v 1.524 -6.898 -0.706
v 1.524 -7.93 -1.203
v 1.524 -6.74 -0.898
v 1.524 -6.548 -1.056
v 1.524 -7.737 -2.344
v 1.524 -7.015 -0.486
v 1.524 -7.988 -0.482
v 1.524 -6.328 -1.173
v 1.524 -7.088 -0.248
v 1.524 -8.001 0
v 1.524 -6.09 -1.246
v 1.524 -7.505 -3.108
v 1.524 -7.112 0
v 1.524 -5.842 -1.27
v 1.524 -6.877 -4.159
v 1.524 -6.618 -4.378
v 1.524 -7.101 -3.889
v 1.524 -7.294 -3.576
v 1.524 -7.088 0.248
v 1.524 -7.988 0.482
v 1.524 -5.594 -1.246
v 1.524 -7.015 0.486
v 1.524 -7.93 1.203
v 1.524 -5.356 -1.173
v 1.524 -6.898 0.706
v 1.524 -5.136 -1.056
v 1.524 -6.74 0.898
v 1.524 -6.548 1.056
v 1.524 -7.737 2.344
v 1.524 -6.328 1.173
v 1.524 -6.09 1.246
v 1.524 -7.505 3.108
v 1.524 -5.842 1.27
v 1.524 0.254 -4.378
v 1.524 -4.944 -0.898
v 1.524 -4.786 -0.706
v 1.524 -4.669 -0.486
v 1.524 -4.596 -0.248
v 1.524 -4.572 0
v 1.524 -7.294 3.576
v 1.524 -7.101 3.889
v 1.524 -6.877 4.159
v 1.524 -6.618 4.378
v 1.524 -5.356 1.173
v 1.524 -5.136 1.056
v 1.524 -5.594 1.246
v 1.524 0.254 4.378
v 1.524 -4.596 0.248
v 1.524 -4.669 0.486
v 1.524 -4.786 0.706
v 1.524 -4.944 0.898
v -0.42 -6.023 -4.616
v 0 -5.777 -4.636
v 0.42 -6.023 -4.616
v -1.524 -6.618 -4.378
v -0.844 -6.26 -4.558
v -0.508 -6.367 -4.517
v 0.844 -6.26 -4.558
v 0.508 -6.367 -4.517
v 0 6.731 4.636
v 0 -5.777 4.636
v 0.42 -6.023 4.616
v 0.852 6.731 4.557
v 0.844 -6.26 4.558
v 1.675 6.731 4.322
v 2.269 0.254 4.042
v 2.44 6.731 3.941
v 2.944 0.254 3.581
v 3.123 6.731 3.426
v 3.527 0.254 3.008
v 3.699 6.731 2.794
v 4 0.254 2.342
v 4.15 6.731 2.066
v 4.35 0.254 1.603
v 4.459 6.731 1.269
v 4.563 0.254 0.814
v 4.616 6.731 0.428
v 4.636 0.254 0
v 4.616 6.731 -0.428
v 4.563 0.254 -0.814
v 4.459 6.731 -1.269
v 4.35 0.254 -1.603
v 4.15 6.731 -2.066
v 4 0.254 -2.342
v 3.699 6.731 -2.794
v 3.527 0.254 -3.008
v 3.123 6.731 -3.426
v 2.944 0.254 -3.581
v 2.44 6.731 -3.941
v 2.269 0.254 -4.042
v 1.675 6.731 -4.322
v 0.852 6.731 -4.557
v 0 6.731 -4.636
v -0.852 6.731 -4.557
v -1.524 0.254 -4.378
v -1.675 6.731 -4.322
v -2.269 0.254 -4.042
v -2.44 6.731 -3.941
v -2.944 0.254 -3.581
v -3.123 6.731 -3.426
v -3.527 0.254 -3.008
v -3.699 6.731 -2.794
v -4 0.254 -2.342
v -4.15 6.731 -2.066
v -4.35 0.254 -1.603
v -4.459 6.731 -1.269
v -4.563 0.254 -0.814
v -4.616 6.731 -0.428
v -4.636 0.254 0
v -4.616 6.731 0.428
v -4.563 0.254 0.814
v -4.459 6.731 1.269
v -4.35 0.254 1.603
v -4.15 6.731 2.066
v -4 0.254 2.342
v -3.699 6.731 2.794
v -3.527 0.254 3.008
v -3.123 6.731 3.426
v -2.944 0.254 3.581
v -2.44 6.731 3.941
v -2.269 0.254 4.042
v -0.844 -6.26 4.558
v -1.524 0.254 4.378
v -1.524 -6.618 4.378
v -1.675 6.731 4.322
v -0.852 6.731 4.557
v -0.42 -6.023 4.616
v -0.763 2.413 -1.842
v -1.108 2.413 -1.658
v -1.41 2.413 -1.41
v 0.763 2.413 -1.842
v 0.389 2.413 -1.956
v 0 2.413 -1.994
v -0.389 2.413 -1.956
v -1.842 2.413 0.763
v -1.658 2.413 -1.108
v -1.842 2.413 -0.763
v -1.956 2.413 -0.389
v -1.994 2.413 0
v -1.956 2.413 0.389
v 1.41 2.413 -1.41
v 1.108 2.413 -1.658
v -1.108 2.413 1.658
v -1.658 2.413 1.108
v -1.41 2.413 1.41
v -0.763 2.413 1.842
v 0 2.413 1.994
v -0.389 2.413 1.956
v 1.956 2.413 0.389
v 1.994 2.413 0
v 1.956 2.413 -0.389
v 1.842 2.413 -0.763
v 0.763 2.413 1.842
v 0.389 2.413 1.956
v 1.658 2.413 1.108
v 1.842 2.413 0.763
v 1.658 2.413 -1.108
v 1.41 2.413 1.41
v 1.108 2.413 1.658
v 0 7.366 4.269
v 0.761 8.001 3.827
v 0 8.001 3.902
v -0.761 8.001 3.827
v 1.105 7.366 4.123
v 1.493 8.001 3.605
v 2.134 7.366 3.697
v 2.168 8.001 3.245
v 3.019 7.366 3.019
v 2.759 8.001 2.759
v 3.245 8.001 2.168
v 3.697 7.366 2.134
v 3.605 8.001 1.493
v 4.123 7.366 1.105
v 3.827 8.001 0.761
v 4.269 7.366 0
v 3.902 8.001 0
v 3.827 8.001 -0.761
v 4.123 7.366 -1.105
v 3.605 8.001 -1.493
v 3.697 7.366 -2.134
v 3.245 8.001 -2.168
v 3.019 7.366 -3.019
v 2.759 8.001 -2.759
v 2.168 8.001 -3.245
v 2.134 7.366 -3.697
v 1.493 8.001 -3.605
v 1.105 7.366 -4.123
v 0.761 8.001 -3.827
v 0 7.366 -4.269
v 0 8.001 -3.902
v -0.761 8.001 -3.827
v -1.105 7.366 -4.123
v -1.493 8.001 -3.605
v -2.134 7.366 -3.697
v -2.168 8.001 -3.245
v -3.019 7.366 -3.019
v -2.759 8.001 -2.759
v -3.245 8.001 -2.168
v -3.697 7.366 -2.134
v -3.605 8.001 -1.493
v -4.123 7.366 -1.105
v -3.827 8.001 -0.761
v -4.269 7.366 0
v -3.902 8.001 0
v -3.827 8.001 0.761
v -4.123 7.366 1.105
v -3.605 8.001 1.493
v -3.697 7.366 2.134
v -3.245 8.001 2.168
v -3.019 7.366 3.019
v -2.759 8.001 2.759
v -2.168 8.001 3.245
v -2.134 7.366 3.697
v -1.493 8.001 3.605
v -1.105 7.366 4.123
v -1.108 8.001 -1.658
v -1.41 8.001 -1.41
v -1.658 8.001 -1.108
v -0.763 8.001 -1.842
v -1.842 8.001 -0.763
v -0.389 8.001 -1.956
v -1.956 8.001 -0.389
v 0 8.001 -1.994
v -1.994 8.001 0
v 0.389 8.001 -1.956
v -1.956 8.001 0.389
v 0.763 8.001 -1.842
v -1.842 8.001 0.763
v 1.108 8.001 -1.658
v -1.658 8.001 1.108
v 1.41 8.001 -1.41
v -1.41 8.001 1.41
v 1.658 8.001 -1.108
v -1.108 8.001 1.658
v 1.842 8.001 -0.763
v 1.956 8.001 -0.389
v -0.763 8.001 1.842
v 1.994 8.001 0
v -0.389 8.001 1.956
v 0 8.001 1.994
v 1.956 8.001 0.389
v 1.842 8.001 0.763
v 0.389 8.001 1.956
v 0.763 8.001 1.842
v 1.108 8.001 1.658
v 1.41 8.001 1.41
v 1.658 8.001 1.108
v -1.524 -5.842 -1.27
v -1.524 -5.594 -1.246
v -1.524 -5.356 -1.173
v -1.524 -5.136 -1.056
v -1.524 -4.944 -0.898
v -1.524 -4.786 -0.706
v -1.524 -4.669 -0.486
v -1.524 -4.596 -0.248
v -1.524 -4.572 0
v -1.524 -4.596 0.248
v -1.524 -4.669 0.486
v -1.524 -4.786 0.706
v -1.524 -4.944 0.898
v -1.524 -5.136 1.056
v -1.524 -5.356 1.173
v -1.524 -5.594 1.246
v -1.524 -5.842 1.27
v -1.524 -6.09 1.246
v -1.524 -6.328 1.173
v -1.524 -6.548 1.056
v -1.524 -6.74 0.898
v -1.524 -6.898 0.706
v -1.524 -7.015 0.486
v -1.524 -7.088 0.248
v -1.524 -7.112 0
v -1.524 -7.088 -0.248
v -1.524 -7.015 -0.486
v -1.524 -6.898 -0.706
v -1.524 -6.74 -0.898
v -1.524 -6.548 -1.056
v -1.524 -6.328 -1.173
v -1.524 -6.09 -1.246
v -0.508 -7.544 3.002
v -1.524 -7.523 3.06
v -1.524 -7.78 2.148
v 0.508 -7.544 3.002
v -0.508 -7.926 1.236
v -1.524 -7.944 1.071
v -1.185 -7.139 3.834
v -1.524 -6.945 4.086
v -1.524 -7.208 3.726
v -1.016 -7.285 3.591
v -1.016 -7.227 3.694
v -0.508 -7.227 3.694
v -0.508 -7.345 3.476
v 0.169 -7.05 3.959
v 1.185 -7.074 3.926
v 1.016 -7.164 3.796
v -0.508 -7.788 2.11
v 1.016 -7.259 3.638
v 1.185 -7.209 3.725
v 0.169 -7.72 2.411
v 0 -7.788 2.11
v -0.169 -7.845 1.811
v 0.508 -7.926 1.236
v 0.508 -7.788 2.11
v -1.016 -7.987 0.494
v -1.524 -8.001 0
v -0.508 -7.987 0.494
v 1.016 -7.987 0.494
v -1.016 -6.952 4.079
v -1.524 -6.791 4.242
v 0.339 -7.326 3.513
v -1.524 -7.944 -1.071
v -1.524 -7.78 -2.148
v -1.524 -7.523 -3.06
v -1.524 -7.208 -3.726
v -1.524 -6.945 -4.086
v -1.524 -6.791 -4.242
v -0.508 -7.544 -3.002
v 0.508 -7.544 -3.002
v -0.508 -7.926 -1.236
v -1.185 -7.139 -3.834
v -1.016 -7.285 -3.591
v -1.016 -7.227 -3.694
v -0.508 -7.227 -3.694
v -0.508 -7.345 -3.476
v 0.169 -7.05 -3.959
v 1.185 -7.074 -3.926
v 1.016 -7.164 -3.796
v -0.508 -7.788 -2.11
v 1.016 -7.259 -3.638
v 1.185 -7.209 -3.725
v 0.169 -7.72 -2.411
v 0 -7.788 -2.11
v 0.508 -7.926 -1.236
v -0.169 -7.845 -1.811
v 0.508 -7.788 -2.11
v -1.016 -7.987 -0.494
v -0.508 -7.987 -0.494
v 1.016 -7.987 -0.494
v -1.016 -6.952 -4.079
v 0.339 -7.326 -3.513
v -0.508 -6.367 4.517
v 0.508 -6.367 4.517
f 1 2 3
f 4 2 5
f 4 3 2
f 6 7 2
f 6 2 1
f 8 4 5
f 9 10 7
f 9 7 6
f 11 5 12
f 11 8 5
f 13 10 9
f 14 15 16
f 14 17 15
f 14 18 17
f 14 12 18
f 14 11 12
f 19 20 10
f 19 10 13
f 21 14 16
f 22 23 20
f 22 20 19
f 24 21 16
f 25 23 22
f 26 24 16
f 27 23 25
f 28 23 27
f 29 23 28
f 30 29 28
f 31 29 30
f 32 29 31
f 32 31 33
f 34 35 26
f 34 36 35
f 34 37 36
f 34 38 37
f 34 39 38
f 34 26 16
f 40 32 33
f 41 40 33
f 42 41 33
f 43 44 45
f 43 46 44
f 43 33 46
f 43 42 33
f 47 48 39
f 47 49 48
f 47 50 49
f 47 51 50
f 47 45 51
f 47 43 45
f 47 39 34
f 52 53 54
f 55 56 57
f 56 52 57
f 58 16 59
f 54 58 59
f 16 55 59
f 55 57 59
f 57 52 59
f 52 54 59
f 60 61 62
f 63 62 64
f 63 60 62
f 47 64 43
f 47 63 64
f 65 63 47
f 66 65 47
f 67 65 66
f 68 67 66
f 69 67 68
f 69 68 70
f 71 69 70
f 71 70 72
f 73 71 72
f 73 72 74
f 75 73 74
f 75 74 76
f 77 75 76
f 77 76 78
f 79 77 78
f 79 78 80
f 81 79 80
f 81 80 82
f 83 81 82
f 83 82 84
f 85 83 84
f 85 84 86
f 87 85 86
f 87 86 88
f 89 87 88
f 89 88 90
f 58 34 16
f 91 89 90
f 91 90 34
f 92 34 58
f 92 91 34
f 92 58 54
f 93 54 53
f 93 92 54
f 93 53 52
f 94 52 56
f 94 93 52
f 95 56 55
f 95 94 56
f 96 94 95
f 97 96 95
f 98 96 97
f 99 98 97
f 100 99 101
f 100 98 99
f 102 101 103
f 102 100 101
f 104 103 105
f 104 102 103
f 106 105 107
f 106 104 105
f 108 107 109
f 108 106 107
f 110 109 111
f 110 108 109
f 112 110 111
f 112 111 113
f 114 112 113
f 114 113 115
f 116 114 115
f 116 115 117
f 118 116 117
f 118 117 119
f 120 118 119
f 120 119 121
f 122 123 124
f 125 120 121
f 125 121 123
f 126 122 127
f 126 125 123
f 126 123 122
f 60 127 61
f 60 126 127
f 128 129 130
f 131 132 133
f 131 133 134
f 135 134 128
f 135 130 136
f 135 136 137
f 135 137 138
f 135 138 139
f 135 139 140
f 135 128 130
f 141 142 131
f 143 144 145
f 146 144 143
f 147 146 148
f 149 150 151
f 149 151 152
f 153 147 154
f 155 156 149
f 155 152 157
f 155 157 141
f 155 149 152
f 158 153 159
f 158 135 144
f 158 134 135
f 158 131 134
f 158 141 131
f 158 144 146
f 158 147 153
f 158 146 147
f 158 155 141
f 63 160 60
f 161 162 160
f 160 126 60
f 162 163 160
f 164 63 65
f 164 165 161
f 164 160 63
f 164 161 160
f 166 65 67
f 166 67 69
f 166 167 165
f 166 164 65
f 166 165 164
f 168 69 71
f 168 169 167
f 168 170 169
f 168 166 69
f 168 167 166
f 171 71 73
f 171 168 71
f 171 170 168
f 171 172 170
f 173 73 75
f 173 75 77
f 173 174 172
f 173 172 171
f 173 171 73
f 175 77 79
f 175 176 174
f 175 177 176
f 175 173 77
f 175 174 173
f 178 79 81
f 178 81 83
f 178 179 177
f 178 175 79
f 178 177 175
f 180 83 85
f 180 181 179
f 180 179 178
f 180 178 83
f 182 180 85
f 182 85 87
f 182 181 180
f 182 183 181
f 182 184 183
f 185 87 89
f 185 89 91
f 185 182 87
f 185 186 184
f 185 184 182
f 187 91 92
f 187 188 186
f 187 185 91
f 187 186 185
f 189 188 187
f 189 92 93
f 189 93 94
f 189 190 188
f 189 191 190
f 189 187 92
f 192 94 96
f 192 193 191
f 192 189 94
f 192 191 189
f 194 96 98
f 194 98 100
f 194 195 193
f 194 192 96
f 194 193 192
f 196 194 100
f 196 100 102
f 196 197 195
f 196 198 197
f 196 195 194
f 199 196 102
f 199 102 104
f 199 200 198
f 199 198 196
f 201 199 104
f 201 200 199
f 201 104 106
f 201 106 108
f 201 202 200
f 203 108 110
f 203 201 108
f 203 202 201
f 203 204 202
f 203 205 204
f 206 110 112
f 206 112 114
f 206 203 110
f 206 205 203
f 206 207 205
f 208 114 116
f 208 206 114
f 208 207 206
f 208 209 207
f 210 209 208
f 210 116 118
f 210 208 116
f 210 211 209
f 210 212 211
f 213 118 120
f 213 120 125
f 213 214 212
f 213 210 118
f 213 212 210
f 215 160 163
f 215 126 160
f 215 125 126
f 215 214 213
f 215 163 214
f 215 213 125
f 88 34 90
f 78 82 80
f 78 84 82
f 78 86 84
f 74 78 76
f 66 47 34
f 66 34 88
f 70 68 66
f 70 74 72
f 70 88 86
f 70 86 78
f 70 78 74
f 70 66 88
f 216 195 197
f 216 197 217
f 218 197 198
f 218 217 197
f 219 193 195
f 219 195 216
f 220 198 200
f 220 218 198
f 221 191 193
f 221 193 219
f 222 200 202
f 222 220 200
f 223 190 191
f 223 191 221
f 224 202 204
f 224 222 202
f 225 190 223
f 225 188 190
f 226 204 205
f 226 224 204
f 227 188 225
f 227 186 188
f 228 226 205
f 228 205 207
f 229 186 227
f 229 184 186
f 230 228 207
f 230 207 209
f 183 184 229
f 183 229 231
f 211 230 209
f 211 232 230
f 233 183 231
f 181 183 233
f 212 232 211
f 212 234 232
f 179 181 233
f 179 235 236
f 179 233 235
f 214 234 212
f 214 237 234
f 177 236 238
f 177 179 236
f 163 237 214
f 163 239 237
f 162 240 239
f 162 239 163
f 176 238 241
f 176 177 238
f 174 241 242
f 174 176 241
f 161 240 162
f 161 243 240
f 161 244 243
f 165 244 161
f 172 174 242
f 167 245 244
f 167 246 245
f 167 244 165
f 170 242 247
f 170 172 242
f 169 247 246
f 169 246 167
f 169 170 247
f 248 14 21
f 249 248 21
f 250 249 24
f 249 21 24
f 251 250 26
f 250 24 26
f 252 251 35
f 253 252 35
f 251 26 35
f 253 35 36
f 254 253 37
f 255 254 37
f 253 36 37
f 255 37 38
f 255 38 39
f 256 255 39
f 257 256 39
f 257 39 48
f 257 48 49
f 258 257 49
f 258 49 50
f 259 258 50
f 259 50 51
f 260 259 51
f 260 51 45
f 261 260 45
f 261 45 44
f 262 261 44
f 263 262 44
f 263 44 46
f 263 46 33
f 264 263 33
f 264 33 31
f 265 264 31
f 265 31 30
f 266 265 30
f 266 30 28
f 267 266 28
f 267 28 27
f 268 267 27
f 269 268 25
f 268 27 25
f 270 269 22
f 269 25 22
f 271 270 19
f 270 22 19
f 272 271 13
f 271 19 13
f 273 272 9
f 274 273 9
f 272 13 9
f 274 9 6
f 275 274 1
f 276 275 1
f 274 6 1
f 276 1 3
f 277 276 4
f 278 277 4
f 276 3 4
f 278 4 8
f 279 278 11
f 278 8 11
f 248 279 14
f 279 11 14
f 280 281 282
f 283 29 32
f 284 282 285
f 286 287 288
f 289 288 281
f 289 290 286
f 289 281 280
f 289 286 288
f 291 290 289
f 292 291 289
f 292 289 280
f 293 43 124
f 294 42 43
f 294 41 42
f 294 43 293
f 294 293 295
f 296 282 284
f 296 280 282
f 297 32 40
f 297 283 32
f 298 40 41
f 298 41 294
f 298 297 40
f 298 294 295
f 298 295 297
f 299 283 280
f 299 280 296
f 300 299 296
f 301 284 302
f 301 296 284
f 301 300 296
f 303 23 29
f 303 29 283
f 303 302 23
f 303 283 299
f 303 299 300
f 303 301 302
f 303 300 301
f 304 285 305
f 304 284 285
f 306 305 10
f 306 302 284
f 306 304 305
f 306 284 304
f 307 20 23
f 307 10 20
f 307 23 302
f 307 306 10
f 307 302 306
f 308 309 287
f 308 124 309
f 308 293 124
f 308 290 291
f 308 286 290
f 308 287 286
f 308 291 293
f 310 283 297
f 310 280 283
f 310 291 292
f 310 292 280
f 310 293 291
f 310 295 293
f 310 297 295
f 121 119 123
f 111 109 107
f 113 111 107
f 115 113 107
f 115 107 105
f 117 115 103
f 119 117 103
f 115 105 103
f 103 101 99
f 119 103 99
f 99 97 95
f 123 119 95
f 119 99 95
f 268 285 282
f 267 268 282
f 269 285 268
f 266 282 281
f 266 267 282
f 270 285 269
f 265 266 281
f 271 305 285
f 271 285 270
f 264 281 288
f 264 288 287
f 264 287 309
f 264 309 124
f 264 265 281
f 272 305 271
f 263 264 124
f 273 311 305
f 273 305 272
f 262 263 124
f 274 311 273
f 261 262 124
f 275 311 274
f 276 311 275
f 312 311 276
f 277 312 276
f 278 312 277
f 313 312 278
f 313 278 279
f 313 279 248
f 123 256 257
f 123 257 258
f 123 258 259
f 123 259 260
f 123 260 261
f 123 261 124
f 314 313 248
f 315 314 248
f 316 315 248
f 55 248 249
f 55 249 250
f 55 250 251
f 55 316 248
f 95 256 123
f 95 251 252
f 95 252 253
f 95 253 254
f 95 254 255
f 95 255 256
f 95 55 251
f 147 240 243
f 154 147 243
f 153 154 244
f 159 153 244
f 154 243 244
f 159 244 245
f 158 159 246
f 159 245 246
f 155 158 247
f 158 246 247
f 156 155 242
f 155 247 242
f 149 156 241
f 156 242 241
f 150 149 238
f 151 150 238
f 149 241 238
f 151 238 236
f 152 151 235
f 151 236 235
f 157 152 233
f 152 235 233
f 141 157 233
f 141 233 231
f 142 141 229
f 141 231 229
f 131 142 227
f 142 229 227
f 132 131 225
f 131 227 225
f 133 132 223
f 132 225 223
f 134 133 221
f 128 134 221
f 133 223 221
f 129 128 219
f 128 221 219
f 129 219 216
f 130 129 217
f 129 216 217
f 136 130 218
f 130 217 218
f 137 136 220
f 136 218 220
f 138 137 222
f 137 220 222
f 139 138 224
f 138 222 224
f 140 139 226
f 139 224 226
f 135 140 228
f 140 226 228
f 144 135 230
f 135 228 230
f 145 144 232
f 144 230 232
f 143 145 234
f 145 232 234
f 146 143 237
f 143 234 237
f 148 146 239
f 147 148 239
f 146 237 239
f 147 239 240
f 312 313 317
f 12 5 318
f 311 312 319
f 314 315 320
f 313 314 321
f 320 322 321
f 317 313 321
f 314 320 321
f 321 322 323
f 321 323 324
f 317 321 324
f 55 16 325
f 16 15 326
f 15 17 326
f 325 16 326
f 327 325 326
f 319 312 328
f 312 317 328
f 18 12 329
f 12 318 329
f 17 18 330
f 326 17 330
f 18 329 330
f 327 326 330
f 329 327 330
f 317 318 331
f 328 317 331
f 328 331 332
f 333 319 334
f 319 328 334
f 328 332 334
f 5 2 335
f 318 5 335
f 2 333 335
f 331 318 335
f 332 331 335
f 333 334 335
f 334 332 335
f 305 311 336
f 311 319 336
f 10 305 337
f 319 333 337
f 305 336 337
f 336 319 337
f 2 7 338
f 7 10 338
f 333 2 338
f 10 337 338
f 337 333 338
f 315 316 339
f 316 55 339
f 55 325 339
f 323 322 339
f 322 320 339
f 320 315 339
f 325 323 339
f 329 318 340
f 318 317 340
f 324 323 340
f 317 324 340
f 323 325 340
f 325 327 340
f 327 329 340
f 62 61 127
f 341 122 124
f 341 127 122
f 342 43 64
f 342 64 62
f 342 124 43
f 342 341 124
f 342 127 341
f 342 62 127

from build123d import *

# Parameters (mm, degrees)
SKETCH3_R                           = 4.6355
BOSS_EXTRUDE1_DEPTH                 = 8.001
SKETCH4_R                           = 1.9939
CUT_EXTRUDE1_DEPTH                  = 5.588
CHAMFER1_SIZE                       = 1.27
CHAMFER1_SIZE2                      = 0.733234842
CUT_EXTRUDE2_REACH                  = 12.344
CUT_EXTRUDE2_END_RADIUS             = 4.6355
SKETCH5_W                           = 3.887671843
SKETCH5_H                           = 8.255
CUT_EXTRUDE2_DIRECTION_2_REACH      = 12.344
CUT_EXTRUDE2_DIRECTION_2_END_RADIUS = 4.6355
CUT_EXTRUDE3_REACH                  = 13.111
CUT_EXTRUDE4_REACH                  = 13.111
SKETCH7_R                           = 1.27


with BuildPart() as part:
    # Sketch3 → Boss-Extrude1 (new, symmetric)
    with BuildSketch(Plane(origin=(0, 0, 0), x_dir=(1, 0, 0), z_dir=(0, 1, 0))):
        with Locations(Location((0, 0, 0), (0, 0, 270))):
            Circle(SKETCH3_R)
    extrude(amount=BOSS_EXTRUDE1_DEPTH, both=True)

    # Sketch4 → Cut-Extrude1 (cut)
    with BuildSketch(Plane(origin=(0, 8.001, 0), x_dir=(1, 0, 0), z_dir=(0, 1, 0))):
        with Locations(Location((0, 0, 0), (0, 0, 270))):
            Circle(SKETCH4_R)
    extrude(amount=-CUT_EXTRUDE1_DEPTH, mode=Mode.SUBTRACT)

    # Chamfer1
    chamfer1_edges = [part.edges().sort_by_distance(p)[0] for p in [
        (0, 8.001, -4.6355),
    ]]
    chamfer1_side = [part.faces().sort_by_distance(p)[0] for p in [
        (0, 0, -4.6355),
    ]]
    chamfer(chamfer1_edges, length=CHAMFER1_SIZE, length2=CHAMFER1_SIZE2, reference=chamfer1_side[0])

    # Cut-Extrude2: up to this cylinder (the profile starts inside it)
    cut_extrude2_end = Plane(origin=(0, -3.8735, 0), z_dir=(0, -1, 0)) * Cylinder(CUT_EXTRUDE2_END_RADIUS, 34.959, mode=Mode.PRIVATE)
    # Sketch5 → Cut-Extrude2 (cut, up to the surface)
    with BuildSketch(Plane.XY, mode=Mode.PRIVATE) as cut_extrude2_sk1:
        with Locations((-3.467835922, -3.8735)):
            Rectangle(SKETCH5_W, SKETCH5_H)
    cut_extrude2_tool1 = extrude(cut_extrude2_sk1.sketch, amount=-CUT_EXTRUDE2_REACH, mode=Mode.PRIVATE) & cut_extrude2_end
    add(cut_extrude2_tool1.solids().sort_by_distance((-3.467836, -3.8735, 0))[0], mode=Mode.SUBTRACT)
    # Sketch5 → Cut-Extrude2 (cut, up to the surface)
    with BuildSketch(Plane.XY, mode=Mode.PRIVATE) as cut_extrude2_sk2:
        with Locations((3.467835922, -3.8735)):
            Rectangle(SKETCH5_W, SKETCH5_H)
    cut_extrude2_tool2 = extrude(cut_extrude2_sk2.sketch, amount=-CUT_EXTRUDE2_REACH, mode=Mode.PRIVATE) & cut_extrude2_end
    add(cut_extrude2_tool2.solids().sort_by_distance((3.467836, -3.8735, 0))[0], mode=Mode.SUBTRACT)

    # Cut-Extrude2 direction 2: up to this cylinder (the profile starts inside it)
    cut_extrude2_direction_2_end = Plane(origin=(0, -3.8735, 0), z_dir=(0, -1, 0)) * Cylinder(CUT_EXTRUDE2_DIRECTION_2_END_RADIUS, 34.959, mode=Mode.PRIVATE)
    # Sketch5 → Cut-Extrude2 direction 2 (cut, up to the surface)
    with BuildSketch(Plane.XY, mode=Mode.PRIVATE) as cut_extrude2_direction_2_sk1:
        with Locations((-3.467835922, -3.8735)):
            Rectangle(SKETCH5_W, SKETCH5_H)
    cut_extrude2_direction_2_tool1 = extrude(cut_extrude2_direction_2_sk1.sketch, amount=CUT_EXTRUDE2_DIRECTION_2_REACH, mode=Mode.PRIVATE) & cut_extrude2_direction_2_end
    add(cut_extrude2_direction_2_tool1.solids().sort_by_distance((-3.467836, -3.8735, 0))[0], mode=Mode.SUBTRACT)
    # Sketch5 → Cut-Extrude2 direction 2 (cut, up to the surface)
    with BuildSketch(Plane.XY, mode=Mode.PRIVATE) as cut_extrude2_direction_2_sk2:
        with Locations((3.467835922, -3.8735)):
            Rectangle(SKETCH5_W, SKETCH5_H)
    cut_extrude2_direction_2_tool2 = extrude(cut_extrude2_direction_2_sk2.sketch, amount=CUT_EXTRUDE2_DIRECTION_2_REACH, mode=Mode.PRIVATE) & cut_extrude2_direction_2_end
    add(cut_extrude2_direction_2_tool2.solids().sort_by_distance((3.467836, -3.8735, 0))[0], mode=Mode.SUBTRACT)

    # Sketch6 → Cut-Extrude3 (cut, up to next)
    with BuildSketch(Plane(origin=(1.524, 0, 0), x_dir=(0, 0, -1), z_dir=(1, 0, 0)), mode=Mode.PRIVATE) as cut_extrude3_sk1:
        with BuildLine():
            add(Edge.make_bspline(
                [(-4.377817293, -6.618376883), (-3.503121267, -7.894799124), (-0.664999949, -8.001), (0, -8.001)],
                knots=[0.156984914, 0.156984914, 0.156984914, 0.156984914, 1, 1, 1, 1], degree=3))
            Line((-4.377817293, -6.618376883), (-4.377817293, -8.001))
            Line((-4.377817293, -8.001), (0, -8.001))
        make_face()
    cut_extrude3_tool1 = extrude(cut_extrude3_sk1.sketch, amount=-CUT_EXTRUDE3_REACH, mode=Mode.PRIVATE) & part.part
    # Sketch6 → Cut-Extrude3 (cut, up to next)
    with BuildSketch(Plane(origin=(1.524, 0, 0), x_dir=(0, 0, -1), z_dir=(1, 0, 0)), mode=Mode.PRIVATE) as cut_extrude3_sk2:
        with BuildLine():
            add(Edge.make_bspline(
                [(4.377817293, -6.618376883), (3.503121267, -7.894799124), (0.664999949, -8.001), (0, -8.001)],
                knots=[0.156984914, 0.156984914, 0.156984914, 0.156984914, 1, 1, 1, 1], degree=3))
            Line((0, -8.001), (4.377817293, -8.001))
            Line((4.377817293, -8.001), (4.377817293, -6.618376883))
        make_face()
    cut_extrude3_tool2 = extrude(cut_extrude3_sk2.sketch, amount=-CUT_EXTRUDE3_REACH, mode=Mode.PRIVATE) & part.part
    # Sketch6 → Cut-Extrude3 (cut, up to next)
    with BuildSketch(Plane(origin=(1.524, 0, 0), x_dir=(0, 0, -1), z_dir=(1, 0, 0)), mode=Mode.PRIVATE) as cut_extrude3_sk3:
        with BuildLine():
            add(Edge.make_bspline(
                [(-4.6355, -5.776685713), (-4.6355, -6.102410184), (-4.54070178, -6.380683586), (-4.377817293, -6.618376883)],
                knots=[0, 0, 0, 0, 0.156984914, 0.156984914, 0.156984914, 0.156984914], degree=3))
            Line((-4.6355, -5.776685713), (-4.6355, -8.001))
            Line((-4.6355, -8.001), (-4.377817293, -8.001))
            Line((-4.377817293, -8.001), (-4.377817293, -6.618376883))
        make_face()
    cut_extrude3_tool3 = extrude(cut_extrude3_sk3.sketch, amount=-CUT_EXTRUDE3_REACH, mode=Mode.PRIVATE) & part.part
    # Sketch6 → Cut-Extrude3 (cut, up to next)
    with BuildSketch(Plane(origin=(1.524, 0, 0), x_dir=(0, 0, -1), z_dir=(1, 0, 0)), mode=Mode.PRIVATE) as cut_extrude3_sk4:
        with BuildLine():
            Line((4.6355, -8.001), (4.6355, -5.776685713))
            add(Edge.make_bspline(
                [(4.6355, -5.776685713), (4.6355, -6.102410184), (4.54070178, -6.380683586), (4.377817293, -6.618376883)],
                knots=[0, 0, 0, 0, 0.156984914, 0.156984914, 0.156984914, 0.156984914], degree=3))
            Line((4.377817293, -6.618376883), (4.377817293, -8.001))
            Line((4.377817293, -8.001), (4.6355, -8.001))
        make_face()
    cut_extrude3_tool4 = extrude(cut_extrude3_sk4.sketch, amount=-CUT_EXTRUDE3_REACH, mode=Mode.PRIVATE) & part.part
    add(cut_extrude3_tool1.solids().sort_by_distance((1.524, -7.641566, 3.372722))[0], mode=Mode.SUBTRACT)
    add(cut_extrude3_tool2.solids().sort_by_distance((1.524, -7.641566, -3.372722))[0], mode=Mode.SUBTRACT)
    add(cut_extrude3_tool3.solids().sort_by_distance((1.524, -7.165384, 4.5152))[0], mode=Mode.SUBTRACT)
    add(cut_extrude3_tool4.solids().sort_by_distance((1.524, -7.165384, -4.5152))[0], mode=Mode.SUBTRACT)

    # Sketch7 → Cut-Extrude4 (cut, up to next)
    with BuildSketch(Plane(origin=(1.524, 0, 0), x_dir=(0, 0, -1), z_dir=(1, 0, 0)), mode=Mode.PRIVATE) as cut_extrude4_sk1:
        with Locations((0, -5.842)):
            Circle(SKETCH7_R)
    cut_extrude4_tool1 = extrude(cut_extrude4_sk1.sketch, amount=-CUT_EXTRUDE4_REACH, mode=Mode.PRIVATE) & part.part
    add(cut_extrude4_tool1.solids().sort_by_distance((1.524, -5.842, 0))[0], mode=Mode.SUBTRACT)


solid = part.part
